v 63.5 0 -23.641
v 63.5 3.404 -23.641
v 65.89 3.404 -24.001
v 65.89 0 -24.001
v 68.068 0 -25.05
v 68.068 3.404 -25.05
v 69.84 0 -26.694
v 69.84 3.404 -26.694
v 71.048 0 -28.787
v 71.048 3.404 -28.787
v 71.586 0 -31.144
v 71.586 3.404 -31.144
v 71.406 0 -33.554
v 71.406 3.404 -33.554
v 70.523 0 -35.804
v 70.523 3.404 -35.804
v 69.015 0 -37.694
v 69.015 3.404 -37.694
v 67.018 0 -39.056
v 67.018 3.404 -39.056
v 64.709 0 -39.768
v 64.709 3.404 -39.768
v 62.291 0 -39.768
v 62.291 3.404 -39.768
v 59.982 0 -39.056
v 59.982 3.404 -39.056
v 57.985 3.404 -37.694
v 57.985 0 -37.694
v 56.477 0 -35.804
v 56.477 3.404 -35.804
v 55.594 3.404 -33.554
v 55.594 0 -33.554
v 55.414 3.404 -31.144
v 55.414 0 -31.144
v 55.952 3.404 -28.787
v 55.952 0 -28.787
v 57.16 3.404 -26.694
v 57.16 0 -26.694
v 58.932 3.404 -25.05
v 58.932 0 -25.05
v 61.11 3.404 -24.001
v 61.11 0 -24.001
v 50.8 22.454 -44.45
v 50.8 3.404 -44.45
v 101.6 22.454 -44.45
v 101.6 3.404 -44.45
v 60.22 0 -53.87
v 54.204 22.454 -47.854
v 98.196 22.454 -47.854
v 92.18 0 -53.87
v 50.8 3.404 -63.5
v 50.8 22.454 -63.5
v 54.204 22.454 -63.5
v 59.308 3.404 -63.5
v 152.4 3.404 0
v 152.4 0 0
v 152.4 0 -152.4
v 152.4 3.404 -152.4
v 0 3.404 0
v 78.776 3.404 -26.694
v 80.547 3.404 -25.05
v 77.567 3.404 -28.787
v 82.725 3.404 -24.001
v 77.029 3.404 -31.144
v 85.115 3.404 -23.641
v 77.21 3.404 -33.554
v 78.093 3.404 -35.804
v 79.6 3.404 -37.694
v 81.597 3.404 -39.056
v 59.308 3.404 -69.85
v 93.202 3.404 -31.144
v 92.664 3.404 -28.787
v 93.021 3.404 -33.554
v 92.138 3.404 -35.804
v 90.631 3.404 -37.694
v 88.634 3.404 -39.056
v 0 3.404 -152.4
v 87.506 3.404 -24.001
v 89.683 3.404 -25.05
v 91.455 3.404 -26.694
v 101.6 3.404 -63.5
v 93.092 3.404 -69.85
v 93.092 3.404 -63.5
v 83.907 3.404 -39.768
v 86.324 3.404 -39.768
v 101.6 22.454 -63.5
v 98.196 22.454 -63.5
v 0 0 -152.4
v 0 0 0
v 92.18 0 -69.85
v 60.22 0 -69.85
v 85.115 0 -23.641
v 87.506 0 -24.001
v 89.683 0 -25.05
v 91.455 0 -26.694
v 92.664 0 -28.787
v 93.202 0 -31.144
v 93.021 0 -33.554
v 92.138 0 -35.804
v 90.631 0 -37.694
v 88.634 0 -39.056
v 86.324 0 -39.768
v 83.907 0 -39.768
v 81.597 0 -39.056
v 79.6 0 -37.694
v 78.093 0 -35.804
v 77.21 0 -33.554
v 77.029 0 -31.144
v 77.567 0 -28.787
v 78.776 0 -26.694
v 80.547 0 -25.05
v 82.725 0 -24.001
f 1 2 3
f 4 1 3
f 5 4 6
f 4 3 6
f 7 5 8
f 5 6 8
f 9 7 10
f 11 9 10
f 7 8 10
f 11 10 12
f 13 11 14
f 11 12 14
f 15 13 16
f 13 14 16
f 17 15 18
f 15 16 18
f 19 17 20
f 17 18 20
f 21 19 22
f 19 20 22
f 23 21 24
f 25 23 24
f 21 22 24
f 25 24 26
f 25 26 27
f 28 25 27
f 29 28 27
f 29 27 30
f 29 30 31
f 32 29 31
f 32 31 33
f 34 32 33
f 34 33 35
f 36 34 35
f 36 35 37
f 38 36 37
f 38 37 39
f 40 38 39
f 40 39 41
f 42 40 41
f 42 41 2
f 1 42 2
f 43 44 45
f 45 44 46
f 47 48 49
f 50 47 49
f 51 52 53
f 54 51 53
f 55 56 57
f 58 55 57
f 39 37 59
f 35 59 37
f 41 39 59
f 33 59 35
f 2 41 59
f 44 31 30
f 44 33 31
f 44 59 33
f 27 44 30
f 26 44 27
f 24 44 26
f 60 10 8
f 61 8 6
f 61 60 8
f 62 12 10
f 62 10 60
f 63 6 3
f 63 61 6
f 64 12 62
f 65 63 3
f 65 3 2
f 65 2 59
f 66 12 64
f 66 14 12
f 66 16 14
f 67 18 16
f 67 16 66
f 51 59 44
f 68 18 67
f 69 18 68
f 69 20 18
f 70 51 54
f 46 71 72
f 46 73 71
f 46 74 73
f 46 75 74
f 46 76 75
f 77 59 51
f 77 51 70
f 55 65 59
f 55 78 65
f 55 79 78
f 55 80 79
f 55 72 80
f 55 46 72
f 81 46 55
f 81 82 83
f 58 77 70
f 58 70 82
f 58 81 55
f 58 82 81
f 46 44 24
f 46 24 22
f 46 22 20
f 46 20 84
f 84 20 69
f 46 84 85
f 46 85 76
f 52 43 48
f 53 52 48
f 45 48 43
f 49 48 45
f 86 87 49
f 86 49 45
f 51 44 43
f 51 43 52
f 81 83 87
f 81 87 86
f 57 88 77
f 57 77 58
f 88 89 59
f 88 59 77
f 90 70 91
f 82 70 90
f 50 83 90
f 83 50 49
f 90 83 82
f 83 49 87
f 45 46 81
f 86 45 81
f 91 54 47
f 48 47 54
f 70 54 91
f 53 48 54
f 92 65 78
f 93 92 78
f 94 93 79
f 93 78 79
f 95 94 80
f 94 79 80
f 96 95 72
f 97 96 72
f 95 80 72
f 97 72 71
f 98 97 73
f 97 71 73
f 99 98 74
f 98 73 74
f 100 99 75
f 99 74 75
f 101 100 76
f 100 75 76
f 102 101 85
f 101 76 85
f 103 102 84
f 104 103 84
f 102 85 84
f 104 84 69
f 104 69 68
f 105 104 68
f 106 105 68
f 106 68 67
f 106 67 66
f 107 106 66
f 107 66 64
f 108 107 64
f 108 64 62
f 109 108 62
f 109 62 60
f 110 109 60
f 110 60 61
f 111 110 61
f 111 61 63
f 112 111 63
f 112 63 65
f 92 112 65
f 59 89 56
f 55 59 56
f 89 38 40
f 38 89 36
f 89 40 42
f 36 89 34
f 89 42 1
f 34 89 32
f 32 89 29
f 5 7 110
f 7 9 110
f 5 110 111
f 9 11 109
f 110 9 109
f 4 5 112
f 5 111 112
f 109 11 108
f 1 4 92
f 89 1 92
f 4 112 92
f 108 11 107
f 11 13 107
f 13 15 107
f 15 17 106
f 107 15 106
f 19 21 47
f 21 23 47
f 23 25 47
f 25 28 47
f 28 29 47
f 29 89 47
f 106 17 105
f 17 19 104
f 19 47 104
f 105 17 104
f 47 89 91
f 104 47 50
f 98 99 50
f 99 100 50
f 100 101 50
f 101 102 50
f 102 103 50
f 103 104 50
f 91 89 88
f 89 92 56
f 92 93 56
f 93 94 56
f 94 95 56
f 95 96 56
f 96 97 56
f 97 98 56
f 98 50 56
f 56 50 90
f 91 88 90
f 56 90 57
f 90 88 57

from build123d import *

# Parameters (mm, degrees)
SKETCH1_W           = 152.4
SKETCH1_H           = 152.4
BOSS_EXTRUDE1_DEPTH = 3.4036
SKETCH2_R           = 8.10895
CUT_EXTRUDE1_DEPTH  = 216.553020143
SKETCH3_W           = 50.8
SKETCH3_H           = 19.05
BOSS_EXTRUDE2_DEPTH = 19.05
SKETCH4_W           = 43.9928
SKETCH4_H           = 21.9964
CUT_EXTRUDE2_DEPTH  = 217.692602903
DRAFT1_ANGLE        = 15


with BuildPart() as part:
    # Sketch1 → Boss-Extrude1 (new body)
    with BuildSketch(Plane(origin=(0, 0, 0), x_dir=(1, 0, 0), z_dir=(0, 1, 0))):
        with Locations((76.2, 76.2)):
            Rectangle(SKETCH1_W, SKETCH1_H)
    extrude(amount=BOSS_EXTRUDE1_DEPTH)

    # Sketch2 → Cut-Extrude1 (cut, through all)
    with BuildSketch(Plane(origin=(0, 3.4036, 0), x_dir=(1, 0, 0), z_dir=(0, 1, 0))):
        with Locations(Location((63.5, 31.75, 0), (0, 0, 270))):
            Circle(SKETCH2_R)
        with Locations(Location((85.1154, 31.75, 0), (0, 0, 270))):
            Circle(SKETCH2_R)
    extrude(amount=-CUT_EXTRUDE1_DEPTH, mode=Mode.SUBTRACT)

    # Sketch3 → Boss-Extrude2 (add)
    with BuildSketch(Plane(origin=(0, 3.4036, 0), x_dir=(1, 0, 0), z_dir=(0, 1, 0))):
        with Locations((76.2, 53.975)):
            Rectangle(SKETCH3_W, SKETCH3_H)
    extrude(amount=BOSS_EXTRUDE2_DEPTH)

    # Sketch4 → Cut-Extrude2 (cut, through all)
    with BuildSketch(Plane(origin=(0, 22.4536, 0), x_dir=(1, 0, 0), z_dir=(0, 1, 0))):
        with Locations((76.2, 58.8518)):
            Rectangle(SKETCH4_W, SKETCH4_H)
    extrude(amount=-CUT_EXTRUDE2_DEPTH, mode=Mode.SUBTRACT)

    # Draft1
    draft1_faces = [part.faces().sort_by_distance(p)[0] for p in [
        (54.2036, 10.674787523, -56.314190406),
        (98.1964, 10.674787523, -56.314190406),
        (76.2, 11.2268, -47.8536),
    ]]
    draft(draft1_faces, Plane.ZX.offset(22.4536), DRAFT1_ANGLE)


solid = part.part
